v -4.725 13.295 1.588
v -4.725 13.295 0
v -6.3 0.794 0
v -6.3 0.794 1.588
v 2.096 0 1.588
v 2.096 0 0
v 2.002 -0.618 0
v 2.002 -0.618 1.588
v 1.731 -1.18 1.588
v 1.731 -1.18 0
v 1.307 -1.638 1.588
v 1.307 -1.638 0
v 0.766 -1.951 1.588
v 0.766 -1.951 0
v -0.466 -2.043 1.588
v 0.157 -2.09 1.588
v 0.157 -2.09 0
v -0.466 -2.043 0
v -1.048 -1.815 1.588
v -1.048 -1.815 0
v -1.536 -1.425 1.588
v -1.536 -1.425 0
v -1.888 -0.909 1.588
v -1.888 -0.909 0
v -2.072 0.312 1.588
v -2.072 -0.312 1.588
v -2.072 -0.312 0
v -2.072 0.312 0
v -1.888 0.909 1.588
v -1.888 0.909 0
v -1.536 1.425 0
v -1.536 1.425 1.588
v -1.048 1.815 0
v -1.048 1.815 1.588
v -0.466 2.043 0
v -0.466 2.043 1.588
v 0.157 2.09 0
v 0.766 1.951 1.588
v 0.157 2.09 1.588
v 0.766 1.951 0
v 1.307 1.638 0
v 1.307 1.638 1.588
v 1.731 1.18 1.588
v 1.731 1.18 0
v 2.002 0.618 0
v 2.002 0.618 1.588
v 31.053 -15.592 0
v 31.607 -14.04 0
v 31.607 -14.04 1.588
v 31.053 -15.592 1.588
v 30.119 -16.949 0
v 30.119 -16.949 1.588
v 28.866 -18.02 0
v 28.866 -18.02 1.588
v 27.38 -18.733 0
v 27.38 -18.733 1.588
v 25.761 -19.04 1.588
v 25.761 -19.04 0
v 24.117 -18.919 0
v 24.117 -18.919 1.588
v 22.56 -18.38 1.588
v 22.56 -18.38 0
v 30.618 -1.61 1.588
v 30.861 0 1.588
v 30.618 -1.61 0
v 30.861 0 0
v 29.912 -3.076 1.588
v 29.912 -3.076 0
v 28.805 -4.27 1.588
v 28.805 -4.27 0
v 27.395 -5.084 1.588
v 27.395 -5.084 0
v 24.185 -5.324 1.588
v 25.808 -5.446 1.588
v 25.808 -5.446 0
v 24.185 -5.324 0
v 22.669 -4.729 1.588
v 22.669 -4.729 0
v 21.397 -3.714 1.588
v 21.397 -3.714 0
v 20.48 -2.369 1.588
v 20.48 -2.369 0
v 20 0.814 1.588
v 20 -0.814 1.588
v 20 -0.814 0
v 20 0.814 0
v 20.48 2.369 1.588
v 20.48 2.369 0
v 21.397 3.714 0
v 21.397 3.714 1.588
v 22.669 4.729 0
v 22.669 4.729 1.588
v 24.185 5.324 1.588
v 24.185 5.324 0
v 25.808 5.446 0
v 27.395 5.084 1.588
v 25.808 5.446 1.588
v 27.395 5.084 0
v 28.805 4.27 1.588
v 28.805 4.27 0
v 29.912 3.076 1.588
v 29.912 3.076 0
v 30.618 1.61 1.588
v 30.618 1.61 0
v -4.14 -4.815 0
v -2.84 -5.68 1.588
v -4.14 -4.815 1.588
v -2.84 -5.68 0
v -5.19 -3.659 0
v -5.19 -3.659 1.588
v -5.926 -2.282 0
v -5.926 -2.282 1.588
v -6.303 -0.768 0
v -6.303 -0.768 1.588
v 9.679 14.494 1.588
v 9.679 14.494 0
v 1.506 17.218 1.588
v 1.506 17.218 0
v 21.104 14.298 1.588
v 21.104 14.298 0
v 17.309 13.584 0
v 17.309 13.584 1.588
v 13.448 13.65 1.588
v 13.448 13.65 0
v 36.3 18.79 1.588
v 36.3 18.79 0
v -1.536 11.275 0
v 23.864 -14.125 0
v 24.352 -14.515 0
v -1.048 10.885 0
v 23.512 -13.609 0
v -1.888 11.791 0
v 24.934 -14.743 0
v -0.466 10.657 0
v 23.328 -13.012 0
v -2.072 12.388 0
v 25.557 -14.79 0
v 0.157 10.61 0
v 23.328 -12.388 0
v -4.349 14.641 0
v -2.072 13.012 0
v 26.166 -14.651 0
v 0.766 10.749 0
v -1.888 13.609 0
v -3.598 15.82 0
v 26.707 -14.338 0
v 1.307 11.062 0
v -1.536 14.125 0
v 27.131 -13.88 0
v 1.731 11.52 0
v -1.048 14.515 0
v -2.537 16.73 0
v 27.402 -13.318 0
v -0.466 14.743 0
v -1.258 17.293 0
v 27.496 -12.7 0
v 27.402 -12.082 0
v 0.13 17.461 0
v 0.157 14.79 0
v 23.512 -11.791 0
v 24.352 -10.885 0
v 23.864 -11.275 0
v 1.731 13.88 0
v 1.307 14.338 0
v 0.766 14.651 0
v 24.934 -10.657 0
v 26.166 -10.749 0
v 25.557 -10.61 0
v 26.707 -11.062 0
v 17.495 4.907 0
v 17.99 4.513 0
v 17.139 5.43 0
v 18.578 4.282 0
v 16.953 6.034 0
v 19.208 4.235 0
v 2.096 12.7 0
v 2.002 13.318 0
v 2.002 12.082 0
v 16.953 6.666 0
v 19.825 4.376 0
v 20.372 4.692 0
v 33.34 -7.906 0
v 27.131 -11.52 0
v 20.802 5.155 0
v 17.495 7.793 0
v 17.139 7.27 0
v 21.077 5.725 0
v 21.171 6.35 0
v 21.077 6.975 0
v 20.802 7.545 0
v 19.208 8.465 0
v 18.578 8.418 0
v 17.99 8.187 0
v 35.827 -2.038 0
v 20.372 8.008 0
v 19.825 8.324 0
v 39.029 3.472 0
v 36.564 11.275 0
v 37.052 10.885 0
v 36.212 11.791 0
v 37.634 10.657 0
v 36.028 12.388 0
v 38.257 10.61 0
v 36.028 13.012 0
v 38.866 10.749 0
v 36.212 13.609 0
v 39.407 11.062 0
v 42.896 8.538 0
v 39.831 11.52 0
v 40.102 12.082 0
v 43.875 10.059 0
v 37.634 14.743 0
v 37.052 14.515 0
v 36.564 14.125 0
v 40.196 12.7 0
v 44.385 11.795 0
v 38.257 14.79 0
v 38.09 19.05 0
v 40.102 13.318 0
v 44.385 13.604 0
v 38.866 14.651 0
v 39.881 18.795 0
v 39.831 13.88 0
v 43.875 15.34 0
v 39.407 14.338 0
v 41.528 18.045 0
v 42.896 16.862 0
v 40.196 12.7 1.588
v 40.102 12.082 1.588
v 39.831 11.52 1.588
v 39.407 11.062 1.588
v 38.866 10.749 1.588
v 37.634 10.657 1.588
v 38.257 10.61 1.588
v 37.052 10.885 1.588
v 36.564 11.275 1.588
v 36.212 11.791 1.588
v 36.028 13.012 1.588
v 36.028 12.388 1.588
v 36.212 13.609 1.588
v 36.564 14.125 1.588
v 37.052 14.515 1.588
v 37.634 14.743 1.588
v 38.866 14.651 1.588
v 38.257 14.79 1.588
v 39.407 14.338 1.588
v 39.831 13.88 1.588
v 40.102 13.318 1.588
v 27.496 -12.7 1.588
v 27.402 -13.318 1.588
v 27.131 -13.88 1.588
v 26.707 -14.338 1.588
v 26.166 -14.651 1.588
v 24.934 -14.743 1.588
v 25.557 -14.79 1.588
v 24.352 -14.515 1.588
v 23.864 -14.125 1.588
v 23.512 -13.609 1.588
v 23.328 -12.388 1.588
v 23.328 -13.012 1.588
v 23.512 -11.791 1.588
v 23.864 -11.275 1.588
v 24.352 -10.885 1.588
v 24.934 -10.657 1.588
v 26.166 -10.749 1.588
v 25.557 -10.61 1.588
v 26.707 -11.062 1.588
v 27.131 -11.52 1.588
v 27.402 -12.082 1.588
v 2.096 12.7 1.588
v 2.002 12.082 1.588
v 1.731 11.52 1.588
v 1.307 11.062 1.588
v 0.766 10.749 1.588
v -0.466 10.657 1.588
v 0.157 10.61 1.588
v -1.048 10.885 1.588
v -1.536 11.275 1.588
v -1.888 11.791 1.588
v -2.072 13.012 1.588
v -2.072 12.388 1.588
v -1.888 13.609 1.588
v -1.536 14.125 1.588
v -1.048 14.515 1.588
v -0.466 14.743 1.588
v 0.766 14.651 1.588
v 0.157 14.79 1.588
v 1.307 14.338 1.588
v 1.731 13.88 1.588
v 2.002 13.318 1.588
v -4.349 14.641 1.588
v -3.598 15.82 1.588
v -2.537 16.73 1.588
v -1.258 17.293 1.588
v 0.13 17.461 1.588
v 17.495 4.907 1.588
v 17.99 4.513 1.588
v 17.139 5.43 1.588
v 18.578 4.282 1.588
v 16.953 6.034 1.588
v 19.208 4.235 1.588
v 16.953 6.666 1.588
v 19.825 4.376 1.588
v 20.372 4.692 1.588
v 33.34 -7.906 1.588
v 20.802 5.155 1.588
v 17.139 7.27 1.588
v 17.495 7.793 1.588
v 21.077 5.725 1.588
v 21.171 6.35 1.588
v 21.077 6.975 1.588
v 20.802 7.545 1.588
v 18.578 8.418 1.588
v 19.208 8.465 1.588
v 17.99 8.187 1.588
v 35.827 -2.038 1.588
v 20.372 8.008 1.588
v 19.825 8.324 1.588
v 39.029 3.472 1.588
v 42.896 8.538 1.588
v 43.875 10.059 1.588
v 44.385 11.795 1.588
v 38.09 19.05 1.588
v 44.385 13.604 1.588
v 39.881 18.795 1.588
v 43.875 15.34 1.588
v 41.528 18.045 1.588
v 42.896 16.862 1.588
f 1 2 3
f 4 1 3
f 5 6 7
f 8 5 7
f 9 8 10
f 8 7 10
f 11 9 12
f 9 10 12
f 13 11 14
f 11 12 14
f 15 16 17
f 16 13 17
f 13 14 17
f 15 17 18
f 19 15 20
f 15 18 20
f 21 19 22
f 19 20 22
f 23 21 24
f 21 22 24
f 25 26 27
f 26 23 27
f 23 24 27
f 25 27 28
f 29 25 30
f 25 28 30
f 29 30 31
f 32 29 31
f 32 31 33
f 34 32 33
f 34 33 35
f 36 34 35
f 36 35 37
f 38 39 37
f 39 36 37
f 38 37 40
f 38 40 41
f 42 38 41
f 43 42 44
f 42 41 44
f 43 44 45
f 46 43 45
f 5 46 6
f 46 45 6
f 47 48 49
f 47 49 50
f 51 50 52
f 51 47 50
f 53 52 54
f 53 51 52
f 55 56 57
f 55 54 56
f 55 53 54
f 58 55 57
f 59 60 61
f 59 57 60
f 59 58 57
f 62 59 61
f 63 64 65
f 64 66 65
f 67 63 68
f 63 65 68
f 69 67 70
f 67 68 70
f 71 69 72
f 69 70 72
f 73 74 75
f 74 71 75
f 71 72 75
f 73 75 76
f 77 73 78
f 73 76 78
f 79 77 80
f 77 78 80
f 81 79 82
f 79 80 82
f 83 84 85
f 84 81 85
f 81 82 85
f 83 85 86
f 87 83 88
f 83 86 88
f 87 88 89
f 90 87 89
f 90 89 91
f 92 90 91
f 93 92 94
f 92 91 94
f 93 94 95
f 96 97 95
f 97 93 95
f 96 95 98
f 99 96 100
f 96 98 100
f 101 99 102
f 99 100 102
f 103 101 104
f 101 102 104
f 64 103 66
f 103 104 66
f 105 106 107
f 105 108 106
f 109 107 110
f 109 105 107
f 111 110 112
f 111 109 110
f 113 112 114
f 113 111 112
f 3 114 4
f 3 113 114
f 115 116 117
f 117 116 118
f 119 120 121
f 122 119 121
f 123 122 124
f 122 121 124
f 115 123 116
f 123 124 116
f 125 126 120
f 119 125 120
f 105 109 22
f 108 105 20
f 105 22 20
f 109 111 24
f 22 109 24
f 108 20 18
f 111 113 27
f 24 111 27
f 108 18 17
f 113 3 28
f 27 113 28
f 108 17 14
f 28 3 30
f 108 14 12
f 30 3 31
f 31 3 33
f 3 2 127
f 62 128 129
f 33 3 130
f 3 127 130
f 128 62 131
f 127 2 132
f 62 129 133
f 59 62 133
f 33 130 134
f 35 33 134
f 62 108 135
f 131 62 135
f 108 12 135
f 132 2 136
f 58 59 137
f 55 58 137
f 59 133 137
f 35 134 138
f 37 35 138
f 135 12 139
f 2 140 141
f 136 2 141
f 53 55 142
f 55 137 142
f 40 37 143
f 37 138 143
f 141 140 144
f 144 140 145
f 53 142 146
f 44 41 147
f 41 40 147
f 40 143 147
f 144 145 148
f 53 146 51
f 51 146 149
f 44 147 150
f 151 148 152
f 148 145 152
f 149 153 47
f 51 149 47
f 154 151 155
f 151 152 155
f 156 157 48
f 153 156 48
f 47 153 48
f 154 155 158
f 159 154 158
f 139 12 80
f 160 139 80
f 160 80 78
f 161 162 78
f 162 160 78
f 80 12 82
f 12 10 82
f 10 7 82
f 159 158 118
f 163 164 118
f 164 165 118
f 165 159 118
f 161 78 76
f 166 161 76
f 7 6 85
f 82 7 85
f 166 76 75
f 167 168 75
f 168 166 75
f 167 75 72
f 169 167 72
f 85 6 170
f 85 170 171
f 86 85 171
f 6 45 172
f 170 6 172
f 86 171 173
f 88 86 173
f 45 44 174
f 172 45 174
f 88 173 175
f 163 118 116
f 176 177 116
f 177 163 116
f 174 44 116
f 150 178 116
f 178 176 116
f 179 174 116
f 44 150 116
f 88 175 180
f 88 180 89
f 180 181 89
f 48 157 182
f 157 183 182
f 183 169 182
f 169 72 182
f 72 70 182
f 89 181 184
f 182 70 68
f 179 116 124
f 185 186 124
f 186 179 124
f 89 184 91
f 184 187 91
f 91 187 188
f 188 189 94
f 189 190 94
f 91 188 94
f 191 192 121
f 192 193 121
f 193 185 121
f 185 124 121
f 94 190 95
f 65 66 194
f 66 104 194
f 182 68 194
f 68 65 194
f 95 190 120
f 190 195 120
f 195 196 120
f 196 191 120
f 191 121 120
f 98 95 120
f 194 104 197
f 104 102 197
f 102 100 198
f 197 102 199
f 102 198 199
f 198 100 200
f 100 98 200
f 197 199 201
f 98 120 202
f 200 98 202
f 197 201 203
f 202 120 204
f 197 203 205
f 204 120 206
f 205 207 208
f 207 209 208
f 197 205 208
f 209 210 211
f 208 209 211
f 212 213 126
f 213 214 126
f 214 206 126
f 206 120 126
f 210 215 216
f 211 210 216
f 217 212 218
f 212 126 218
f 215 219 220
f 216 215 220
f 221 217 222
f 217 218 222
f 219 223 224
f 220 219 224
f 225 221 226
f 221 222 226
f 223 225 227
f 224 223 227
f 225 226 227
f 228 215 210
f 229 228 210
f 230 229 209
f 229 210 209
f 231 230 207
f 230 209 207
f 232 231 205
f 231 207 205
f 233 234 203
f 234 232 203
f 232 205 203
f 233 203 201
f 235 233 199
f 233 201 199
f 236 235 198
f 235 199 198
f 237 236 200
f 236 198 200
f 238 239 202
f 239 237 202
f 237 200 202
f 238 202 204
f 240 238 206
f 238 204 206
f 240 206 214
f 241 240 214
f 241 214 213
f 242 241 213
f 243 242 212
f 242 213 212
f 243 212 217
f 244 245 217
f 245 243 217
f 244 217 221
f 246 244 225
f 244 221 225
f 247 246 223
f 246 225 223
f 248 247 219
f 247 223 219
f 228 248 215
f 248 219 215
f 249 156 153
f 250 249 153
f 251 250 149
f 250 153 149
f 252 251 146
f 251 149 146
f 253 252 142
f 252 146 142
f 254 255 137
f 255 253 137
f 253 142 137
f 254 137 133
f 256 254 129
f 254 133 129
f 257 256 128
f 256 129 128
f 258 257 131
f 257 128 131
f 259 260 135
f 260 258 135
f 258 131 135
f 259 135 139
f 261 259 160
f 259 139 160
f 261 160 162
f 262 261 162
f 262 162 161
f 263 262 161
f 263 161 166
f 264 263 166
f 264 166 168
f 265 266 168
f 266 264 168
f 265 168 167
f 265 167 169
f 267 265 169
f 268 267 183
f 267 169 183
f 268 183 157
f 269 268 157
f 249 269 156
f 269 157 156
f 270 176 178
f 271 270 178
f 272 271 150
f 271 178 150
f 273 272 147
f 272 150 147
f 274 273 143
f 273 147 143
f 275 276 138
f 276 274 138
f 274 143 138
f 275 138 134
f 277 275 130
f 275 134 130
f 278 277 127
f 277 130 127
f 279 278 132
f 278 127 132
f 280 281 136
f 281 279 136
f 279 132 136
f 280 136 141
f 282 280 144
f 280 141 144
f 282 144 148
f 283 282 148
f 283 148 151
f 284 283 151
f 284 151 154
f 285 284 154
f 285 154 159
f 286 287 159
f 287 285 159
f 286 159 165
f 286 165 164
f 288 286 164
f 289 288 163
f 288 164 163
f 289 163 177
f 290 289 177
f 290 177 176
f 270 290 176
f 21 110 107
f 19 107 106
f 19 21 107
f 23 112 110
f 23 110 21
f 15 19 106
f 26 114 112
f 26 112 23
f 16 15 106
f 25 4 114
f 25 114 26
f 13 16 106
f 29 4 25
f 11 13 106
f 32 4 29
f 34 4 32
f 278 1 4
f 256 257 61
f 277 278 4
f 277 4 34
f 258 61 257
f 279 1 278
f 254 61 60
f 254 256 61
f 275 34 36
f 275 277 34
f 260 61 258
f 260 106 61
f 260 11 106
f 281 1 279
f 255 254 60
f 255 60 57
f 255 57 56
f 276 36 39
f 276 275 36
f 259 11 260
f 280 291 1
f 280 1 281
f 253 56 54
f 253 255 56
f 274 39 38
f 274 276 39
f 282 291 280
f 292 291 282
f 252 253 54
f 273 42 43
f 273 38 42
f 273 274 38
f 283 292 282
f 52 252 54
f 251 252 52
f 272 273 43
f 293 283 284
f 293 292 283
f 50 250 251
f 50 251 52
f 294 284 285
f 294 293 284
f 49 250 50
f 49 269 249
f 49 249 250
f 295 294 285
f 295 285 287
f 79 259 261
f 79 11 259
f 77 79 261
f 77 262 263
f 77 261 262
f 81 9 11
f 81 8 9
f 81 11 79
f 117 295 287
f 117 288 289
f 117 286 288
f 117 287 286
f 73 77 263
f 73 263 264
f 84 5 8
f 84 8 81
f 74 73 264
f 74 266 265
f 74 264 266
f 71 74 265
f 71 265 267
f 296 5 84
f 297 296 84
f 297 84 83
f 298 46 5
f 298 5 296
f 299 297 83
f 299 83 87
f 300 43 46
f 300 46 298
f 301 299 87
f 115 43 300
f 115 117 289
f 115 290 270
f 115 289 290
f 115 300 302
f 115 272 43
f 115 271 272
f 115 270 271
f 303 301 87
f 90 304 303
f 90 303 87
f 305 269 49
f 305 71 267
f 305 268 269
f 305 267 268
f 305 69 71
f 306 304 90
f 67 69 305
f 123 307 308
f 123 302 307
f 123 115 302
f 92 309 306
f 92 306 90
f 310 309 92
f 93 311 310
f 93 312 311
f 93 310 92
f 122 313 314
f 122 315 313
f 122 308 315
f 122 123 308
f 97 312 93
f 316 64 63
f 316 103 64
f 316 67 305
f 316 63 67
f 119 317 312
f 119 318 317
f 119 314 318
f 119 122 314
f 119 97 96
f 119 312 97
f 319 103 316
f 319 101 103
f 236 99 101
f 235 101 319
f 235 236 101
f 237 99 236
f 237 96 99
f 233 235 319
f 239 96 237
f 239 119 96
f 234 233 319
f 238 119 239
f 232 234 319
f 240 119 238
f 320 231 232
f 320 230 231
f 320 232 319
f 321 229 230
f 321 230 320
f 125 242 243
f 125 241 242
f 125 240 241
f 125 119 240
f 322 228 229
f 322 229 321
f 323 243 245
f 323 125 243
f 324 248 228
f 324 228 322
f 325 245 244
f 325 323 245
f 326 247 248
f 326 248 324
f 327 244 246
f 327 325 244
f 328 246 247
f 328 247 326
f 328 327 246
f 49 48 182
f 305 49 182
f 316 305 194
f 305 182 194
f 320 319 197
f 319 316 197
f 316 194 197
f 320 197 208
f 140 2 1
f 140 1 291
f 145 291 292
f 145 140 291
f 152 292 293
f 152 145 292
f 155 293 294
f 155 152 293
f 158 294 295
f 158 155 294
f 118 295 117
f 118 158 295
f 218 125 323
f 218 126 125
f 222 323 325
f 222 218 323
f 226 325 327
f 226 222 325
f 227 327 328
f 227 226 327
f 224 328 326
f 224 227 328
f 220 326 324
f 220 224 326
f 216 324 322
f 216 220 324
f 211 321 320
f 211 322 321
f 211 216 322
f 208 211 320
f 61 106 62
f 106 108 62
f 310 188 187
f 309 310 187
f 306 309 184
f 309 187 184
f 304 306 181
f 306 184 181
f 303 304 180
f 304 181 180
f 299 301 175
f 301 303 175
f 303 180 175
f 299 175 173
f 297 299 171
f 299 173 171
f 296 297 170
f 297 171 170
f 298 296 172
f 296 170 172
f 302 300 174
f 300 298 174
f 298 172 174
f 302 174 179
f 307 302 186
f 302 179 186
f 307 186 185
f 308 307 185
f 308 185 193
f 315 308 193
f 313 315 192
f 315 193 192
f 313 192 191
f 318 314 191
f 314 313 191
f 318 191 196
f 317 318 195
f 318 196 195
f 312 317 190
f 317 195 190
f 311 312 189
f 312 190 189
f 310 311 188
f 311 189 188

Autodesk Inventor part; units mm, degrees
ref_plane "YZ Plane" through (0, 0, 0) normal (1, 0, 0) x (0, 1, 0)
ref_plane "XZ Plane" through (0, 0, 0) normal (0, 1, 0) x (-1, 0, 0)
ref_plane "XY Plane" through (0, 0, 0) normal (0, 0, 1) x (1, 0, 0)
sketch "Sketch1" plane through (0, 0, 0) normal (0, 0, 1) x (1, 0, 0)
  circle A0 centre (0, 0) radius 2.0955
  circle A1 centre (0, 12.7) radius 2.0955
  circle A2 centre (19.05, 6.35) radius 2.1209
  circle A3 centre (38.1, 12.7) radius 2.0955
  circle A4 centre (25.4, -12.7) radius 2.0955
  arc A5 (-6.3002, 0.7937) -> (-2.8398, -5.6796) centre (0, 0) ccw
  arc A6 (1.506, 17.2181) -> (-4.7251, 13.2953) centre (0, 12.7) ccw
  arc A7 (42.896, 8.5381) -> (36.3, 18.7895) centre (38.1, 12.7) ccw
  arc A8 (22.5602, -18.3796) -> (31.7002, -13.4938) centre (25.4, -12.7) ccw
  circle A9 centre (25.4, 0) radius 5.461
  line L0 (9.6793, 14.4937) -> (1.506, 17.2181)
  line L1 (36.3, 18.7895) -> (21.1035, 14.2975)
  arc A10 (9.6793, 14.4937) -> (21.1035, 14.2975) centre (15.7034, 32.5661) ccw
  arc A11 (42.896, 8.5381) -> (31.6071, -14.0397) centre (81.2637, -24.7569) ccw
  line L2 (-4.7251, 13.2953) -> (-6.3002, 0.7937)
  line L3 (-2.8398, -5.6796) -> (22.5602, -18.3796)
  point P0 (40.6465, 18.517)
  point P1 (44.45, 12.7)
  dimension "d0" = 4.191
  dimension "d1" = 4.191
  dimension "d2" = 4.2418
  dimension "d3" = 4.191
  dimension "d4" = 4.191
  dimension "d5" = 12.7
  dimension "d9" = 10.922
  dimension "d10" = 19.05
  dimension "d16" = 6.35
extrude "Extrusion1" add sketch "Sketch1" along normal blind 1.5875
equation "\"BendRadius\" = Thickness"
equation "\"BendReliefWidth\" = Thickness"
equation "\"BendReliefDepth\" = 0.5 * Thickness"
equation "\"CornerReliefSize\" = 4 * Thickness"
equation "\"MinimumRemnant\" = 2 * Thickness"
equation "\"TransitionRadius\" = BendRadius"
equation "\"JacobiRadiusSize\" = BendRadius"
equation "\"GapSize\" = Thickness"
equation "\"Thickness\" = 1.5875"
properties part number "gearbox_gusset" material "Acetal Resin, White"
